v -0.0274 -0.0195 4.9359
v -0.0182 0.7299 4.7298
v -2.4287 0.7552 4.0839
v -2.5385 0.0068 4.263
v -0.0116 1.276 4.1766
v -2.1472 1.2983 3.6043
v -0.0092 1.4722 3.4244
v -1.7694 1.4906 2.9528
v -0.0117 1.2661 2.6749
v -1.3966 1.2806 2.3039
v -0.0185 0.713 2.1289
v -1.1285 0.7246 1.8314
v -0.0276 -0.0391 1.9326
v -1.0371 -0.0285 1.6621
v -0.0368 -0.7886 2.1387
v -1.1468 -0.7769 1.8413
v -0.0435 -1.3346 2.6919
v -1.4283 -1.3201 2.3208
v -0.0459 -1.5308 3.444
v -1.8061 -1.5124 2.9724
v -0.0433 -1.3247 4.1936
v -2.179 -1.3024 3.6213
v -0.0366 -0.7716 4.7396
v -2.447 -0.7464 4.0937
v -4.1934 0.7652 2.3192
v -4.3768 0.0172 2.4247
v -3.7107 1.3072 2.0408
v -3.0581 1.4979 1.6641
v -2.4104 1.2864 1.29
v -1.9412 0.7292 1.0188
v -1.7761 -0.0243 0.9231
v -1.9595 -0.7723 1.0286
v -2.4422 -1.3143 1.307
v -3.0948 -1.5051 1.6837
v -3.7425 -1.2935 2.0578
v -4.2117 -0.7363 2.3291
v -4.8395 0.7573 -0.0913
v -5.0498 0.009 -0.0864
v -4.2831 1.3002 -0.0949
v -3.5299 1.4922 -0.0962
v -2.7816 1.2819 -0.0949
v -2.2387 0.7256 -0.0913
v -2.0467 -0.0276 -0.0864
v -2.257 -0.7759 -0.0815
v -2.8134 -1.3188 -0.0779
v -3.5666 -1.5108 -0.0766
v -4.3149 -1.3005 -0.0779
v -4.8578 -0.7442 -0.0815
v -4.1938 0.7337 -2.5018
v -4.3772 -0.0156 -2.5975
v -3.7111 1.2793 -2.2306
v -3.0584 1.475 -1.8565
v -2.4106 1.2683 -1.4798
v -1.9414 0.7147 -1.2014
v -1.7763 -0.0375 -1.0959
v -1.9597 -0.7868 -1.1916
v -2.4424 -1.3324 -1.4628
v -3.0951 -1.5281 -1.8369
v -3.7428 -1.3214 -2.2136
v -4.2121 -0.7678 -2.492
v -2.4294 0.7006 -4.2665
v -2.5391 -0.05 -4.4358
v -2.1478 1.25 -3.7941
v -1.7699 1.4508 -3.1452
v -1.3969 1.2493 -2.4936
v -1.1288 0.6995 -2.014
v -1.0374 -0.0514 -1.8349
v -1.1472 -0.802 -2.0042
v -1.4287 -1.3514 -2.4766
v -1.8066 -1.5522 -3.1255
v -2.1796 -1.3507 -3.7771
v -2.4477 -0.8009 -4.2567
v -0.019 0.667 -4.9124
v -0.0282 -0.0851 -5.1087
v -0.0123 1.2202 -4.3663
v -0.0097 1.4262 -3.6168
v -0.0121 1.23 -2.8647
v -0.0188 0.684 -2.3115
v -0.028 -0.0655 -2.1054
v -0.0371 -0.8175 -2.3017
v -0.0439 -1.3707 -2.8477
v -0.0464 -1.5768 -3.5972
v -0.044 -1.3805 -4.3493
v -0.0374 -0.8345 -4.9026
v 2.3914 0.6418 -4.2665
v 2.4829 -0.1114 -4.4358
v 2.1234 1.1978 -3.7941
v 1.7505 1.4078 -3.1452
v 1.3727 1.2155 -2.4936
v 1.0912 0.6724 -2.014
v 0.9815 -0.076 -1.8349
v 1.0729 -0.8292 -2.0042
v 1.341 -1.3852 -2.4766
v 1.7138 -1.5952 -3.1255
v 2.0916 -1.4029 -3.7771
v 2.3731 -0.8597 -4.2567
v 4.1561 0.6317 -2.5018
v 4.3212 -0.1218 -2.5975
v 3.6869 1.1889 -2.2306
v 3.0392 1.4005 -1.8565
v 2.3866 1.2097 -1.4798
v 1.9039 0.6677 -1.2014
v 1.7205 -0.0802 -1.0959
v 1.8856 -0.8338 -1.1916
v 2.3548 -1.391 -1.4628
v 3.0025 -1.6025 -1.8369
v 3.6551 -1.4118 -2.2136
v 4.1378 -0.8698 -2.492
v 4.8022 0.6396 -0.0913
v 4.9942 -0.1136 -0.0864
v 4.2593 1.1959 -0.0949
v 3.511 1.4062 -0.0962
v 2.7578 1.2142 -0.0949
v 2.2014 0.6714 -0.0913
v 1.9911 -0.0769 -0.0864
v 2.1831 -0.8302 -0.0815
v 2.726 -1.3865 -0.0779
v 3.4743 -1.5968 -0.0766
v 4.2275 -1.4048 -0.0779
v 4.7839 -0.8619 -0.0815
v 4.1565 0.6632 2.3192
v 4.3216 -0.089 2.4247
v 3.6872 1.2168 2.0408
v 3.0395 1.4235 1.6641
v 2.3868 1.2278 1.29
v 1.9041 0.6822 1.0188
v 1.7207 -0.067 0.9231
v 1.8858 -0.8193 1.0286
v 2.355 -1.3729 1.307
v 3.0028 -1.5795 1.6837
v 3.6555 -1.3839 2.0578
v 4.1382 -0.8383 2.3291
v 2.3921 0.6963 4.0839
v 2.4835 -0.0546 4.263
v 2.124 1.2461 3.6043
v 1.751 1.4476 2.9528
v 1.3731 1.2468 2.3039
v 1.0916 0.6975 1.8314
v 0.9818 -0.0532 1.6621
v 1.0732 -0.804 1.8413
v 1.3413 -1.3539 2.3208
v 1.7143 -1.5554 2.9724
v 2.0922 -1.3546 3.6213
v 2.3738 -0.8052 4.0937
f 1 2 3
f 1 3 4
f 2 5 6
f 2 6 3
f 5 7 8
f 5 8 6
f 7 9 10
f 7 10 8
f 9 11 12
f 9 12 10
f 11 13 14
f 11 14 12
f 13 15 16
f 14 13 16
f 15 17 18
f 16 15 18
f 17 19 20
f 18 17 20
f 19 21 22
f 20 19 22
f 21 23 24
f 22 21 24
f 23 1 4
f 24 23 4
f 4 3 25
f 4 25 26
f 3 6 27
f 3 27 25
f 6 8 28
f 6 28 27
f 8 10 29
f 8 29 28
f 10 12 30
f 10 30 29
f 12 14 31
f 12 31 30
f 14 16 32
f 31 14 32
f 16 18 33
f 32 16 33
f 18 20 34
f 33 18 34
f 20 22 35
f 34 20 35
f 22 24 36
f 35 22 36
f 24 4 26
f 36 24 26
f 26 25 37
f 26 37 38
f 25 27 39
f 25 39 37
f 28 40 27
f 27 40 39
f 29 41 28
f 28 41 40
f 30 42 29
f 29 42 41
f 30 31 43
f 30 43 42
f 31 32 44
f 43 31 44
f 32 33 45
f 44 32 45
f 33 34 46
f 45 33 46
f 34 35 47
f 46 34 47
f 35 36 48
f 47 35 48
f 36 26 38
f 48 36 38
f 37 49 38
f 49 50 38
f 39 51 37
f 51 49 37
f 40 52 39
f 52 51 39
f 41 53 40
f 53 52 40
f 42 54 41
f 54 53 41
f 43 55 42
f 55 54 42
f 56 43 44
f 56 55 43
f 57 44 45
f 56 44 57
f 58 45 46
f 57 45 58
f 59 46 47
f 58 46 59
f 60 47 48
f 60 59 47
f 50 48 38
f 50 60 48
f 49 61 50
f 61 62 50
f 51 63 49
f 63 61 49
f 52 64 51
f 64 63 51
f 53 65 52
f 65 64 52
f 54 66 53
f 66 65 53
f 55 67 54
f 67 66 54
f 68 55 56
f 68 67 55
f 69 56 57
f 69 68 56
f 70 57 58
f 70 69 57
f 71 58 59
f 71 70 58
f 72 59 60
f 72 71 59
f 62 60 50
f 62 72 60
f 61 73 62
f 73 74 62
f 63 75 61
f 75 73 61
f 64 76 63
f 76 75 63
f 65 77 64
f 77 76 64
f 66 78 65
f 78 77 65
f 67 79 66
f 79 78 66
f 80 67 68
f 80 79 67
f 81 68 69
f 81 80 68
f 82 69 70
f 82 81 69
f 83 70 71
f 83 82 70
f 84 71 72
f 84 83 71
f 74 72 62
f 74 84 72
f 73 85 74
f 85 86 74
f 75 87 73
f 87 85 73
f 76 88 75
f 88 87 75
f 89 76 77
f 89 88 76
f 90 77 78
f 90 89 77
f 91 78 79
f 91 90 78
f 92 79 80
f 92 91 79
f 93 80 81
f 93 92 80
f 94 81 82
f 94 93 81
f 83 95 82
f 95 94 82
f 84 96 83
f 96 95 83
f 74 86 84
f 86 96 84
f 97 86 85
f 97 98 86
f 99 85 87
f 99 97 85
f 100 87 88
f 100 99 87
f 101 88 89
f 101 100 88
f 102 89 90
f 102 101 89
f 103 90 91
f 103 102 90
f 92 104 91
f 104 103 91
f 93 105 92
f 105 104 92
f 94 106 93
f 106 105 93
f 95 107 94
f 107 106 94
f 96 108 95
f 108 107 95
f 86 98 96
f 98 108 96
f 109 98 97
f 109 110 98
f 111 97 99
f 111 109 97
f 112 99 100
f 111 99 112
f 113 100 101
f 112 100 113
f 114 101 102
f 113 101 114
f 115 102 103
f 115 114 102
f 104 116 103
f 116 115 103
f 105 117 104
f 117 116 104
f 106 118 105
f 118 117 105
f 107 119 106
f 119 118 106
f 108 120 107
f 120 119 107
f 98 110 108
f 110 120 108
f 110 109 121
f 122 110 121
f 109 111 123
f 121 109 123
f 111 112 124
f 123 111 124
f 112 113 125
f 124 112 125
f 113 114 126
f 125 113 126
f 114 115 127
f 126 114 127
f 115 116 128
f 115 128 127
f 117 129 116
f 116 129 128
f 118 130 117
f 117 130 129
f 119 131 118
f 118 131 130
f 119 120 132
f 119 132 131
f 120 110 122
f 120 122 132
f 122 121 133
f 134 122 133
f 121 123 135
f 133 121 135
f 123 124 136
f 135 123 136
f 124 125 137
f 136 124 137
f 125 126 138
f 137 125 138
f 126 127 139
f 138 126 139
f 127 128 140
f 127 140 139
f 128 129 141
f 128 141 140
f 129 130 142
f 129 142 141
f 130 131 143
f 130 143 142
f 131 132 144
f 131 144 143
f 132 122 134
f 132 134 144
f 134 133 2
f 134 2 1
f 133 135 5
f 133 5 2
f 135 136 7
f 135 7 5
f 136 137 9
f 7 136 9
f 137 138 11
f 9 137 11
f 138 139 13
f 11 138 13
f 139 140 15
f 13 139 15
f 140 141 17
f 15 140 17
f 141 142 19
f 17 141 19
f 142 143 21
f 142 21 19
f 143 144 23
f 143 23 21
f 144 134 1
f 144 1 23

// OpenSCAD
// Begin.
union() {
translate([-0.0278, -0.05229, -0.08639])
rotate([0, 0.374141, 89.3004])
rotate([0, 90, 0])
rotate_extrude($fn = 12)
translate([3.52071, 0, 0])
circle(r = 1.50166, $fn = 12);

translate([-0.0278, -0.05229, -0.08639])
rotate([0, 0.374141, 89.3004])
rotate([0, 90, 0])
rotate_extrude($fn = 12)
translate([3.52071, 0, 0])
circle(r = 1.50166, $fn = 12);
}
// End.
